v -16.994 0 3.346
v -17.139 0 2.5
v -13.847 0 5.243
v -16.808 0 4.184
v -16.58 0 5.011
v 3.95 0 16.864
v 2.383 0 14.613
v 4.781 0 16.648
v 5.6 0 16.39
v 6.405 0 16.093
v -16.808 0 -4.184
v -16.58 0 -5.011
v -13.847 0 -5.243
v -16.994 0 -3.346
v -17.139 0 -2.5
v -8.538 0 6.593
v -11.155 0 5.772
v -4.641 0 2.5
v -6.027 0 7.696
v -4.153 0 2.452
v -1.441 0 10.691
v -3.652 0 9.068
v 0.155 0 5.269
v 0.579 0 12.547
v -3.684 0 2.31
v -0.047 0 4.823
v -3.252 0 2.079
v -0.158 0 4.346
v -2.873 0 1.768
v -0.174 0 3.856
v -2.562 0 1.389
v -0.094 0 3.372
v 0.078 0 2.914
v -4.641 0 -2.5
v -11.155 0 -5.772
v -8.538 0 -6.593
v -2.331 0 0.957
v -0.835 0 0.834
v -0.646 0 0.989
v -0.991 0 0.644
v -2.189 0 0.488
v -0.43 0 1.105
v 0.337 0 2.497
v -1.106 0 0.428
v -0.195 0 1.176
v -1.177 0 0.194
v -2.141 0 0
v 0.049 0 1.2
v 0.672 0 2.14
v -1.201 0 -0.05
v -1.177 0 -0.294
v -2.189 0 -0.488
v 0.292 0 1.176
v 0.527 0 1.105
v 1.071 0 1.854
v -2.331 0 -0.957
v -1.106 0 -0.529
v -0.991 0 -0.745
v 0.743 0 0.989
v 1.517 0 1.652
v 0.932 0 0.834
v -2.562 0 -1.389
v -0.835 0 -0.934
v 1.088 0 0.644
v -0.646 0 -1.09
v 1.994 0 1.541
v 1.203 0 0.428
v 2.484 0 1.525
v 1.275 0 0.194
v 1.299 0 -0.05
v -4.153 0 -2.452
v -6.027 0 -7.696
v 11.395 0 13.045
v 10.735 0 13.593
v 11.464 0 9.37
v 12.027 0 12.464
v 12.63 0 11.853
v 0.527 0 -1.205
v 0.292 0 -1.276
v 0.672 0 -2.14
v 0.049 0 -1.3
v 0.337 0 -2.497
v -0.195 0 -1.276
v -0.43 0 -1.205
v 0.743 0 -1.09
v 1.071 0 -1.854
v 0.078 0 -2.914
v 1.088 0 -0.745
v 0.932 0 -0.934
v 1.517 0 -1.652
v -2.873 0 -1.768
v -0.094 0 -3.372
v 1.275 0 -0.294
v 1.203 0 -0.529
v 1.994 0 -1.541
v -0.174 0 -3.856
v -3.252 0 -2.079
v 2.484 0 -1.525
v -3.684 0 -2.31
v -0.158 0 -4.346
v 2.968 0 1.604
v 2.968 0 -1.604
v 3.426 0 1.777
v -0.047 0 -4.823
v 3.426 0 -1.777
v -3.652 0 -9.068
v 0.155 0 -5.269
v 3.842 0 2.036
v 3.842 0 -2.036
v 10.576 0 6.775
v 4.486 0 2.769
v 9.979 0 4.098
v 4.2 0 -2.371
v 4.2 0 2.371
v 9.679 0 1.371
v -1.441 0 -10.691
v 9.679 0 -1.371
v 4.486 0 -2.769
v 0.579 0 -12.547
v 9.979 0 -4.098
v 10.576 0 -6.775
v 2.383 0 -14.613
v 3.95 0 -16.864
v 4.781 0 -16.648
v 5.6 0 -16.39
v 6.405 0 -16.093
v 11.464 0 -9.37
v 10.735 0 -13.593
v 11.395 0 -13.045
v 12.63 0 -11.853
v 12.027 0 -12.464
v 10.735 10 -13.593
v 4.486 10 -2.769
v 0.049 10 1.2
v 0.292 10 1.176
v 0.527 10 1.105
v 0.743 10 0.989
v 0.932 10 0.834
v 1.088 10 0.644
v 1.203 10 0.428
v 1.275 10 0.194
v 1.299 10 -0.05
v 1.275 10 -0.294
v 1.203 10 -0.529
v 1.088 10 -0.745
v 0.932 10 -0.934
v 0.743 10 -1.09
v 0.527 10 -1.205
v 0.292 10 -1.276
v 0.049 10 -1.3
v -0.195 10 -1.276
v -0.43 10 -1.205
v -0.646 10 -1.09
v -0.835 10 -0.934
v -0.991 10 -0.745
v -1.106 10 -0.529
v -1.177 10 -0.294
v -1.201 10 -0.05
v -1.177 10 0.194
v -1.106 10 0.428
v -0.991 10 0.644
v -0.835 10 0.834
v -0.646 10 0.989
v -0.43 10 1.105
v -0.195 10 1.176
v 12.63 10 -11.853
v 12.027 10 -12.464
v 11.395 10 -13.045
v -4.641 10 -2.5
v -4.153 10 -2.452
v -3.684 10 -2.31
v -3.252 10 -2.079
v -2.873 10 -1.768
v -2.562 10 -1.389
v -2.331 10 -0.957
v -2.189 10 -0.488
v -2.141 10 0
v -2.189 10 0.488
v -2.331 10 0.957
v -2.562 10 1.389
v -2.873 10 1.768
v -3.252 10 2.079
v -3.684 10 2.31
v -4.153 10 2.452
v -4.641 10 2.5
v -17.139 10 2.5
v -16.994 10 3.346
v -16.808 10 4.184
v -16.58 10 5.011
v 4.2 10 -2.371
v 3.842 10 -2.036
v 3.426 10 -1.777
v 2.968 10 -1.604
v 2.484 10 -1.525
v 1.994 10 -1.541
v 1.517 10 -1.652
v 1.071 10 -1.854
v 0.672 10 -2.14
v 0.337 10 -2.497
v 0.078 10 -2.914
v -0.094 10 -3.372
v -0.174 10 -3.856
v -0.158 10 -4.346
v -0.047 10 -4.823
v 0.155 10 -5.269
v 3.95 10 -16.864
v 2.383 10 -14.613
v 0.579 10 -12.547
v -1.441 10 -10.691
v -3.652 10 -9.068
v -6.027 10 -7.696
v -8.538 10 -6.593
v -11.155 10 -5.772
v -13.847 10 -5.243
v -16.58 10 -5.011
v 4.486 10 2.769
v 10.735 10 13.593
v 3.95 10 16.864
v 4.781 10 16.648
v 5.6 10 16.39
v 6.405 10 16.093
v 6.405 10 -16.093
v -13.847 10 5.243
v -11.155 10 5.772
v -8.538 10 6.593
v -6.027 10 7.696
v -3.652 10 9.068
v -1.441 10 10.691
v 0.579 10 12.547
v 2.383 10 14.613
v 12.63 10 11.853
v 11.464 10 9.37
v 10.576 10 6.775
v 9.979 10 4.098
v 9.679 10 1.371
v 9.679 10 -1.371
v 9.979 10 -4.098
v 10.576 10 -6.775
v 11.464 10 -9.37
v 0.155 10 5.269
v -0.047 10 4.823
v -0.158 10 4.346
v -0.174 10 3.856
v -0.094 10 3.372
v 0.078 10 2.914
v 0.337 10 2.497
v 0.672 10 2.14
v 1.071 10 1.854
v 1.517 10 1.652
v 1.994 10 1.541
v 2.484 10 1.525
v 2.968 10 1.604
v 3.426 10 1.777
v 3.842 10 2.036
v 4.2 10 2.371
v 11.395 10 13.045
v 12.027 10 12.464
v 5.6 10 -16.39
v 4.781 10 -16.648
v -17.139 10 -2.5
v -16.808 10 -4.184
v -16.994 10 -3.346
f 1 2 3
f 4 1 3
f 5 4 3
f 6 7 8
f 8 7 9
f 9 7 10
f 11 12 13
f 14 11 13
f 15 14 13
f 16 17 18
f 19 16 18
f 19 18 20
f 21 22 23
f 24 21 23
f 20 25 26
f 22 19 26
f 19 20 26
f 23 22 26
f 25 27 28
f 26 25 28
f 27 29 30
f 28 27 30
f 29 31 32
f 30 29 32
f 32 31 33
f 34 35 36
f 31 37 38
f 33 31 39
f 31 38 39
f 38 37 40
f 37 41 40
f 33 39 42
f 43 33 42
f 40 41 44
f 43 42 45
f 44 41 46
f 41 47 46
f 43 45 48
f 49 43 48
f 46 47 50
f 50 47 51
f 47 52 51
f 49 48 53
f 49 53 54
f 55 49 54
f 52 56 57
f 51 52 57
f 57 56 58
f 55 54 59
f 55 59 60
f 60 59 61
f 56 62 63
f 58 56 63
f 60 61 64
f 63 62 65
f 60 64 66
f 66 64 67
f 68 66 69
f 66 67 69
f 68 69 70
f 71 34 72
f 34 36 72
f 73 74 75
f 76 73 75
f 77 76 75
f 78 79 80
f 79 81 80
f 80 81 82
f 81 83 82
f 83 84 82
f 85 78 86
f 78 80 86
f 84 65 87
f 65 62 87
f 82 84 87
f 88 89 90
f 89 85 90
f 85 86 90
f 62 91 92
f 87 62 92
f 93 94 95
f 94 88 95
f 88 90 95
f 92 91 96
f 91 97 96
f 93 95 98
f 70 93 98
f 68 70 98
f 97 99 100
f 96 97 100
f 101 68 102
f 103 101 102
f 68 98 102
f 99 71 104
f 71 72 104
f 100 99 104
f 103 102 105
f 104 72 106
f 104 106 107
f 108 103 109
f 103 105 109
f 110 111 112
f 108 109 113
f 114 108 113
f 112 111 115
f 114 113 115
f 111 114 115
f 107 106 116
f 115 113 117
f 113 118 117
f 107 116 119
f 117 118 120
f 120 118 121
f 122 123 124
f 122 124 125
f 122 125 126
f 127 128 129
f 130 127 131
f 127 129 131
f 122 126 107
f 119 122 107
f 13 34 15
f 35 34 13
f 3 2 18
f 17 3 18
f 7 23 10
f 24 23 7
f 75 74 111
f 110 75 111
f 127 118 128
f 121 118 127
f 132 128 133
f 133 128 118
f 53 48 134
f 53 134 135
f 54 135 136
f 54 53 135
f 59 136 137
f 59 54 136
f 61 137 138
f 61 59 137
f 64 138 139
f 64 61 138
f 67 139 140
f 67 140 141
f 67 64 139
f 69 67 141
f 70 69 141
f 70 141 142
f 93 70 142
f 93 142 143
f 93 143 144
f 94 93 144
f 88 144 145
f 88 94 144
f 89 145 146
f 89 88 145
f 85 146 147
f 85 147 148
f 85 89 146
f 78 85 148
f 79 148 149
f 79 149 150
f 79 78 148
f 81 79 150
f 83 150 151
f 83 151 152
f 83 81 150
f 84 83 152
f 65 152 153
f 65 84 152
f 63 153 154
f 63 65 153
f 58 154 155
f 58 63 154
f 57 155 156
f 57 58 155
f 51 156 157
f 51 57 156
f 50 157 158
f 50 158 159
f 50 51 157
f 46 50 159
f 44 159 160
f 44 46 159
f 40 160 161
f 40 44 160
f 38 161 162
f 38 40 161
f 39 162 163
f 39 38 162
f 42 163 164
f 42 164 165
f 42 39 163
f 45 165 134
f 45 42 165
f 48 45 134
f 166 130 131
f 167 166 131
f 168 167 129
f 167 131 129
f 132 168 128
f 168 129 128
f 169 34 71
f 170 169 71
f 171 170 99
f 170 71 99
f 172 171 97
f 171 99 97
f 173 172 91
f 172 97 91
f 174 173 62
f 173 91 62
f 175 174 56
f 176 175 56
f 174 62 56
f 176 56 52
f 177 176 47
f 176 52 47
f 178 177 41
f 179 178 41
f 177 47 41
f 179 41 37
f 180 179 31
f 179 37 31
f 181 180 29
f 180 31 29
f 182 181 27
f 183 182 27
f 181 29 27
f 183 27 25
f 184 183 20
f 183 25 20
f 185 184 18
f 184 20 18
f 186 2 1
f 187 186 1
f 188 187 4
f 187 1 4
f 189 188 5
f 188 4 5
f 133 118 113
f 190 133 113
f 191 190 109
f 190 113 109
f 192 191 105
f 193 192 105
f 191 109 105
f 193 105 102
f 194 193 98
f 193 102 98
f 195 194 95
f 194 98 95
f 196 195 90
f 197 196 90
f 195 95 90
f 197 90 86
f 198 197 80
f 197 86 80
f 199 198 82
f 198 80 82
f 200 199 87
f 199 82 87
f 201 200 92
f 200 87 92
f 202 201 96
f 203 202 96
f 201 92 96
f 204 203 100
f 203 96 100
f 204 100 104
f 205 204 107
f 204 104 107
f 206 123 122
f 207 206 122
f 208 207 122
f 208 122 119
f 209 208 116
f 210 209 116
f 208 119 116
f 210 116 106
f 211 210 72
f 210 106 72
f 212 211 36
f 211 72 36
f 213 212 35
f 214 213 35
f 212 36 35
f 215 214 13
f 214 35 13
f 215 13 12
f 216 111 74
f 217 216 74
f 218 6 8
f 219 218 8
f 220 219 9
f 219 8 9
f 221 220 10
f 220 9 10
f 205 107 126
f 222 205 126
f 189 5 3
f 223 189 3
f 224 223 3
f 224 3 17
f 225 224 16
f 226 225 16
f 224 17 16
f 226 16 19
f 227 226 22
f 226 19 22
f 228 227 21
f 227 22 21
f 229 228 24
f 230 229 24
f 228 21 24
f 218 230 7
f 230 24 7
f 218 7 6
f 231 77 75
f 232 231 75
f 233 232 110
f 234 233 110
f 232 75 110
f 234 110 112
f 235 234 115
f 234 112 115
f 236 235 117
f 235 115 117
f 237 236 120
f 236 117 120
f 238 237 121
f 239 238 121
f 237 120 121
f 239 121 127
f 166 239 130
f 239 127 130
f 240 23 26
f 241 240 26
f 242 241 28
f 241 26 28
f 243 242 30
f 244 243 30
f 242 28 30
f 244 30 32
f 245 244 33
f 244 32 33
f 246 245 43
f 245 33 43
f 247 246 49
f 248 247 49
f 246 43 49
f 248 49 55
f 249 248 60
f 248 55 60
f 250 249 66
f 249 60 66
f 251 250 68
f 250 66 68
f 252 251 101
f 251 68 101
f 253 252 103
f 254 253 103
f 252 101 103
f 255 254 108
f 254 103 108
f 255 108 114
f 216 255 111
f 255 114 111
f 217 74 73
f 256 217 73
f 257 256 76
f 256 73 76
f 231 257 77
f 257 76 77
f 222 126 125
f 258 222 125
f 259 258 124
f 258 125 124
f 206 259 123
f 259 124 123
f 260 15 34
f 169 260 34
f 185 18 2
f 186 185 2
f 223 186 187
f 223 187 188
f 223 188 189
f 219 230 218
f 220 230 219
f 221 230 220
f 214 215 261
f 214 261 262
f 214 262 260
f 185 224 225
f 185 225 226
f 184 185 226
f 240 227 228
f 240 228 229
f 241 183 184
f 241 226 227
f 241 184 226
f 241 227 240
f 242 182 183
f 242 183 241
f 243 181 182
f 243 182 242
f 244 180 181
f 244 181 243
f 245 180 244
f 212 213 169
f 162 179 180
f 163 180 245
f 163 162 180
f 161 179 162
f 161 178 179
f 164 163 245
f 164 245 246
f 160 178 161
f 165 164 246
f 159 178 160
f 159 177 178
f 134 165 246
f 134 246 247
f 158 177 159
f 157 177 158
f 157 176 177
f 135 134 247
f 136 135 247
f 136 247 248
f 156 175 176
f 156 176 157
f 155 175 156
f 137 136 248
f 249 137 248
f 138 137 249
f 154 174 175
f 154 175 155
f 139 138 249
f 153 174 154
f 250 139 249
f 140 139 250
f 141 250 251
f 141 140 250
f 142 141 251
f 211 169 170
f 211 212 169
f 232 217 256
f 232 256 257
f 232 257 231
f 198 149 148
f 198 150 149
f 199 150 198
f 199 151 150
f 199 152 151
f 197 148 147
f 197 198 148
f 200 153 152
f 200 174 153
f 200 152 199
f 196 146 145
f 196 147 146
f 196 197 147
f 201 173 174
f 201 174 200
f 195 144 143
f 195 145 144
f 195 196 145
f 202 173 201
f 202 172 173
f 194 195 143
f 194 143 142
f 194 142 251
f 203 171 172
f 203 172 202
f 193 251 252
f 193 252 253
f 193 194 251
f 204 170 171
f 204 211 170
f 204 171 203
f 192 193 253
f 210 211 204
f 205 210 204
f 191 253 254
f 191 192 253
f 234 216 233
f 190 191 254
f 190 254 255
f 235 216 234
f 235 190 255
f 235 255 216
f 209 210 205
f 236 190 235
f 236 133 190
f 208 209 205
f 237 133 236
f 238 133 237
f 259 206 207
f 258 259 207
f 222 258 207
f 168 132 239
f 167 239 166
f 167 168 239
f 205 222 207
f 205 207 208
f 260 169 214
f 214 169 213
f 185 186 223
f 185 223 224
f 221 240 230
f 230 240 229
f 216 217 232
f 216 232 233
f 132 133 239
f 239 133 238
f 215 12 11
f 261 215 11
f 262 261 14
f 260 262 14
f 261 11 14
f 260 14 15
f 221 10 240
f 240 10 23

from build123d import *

# Parameters (mm, degrees)
SKETCH_1_R      = 1.25
EXTRUDE_1_DEPTH = 10


with BuildPart() as part:
    # 草圖1 → 填料-伸長1 (new body)
    with BuildSketch(Plane(origin=(0, 0, 0), x_dir=(1, 0, 0), z_dir=(0, 1, 0))):
        with BuildLine():
            Line((0.155444566, 5.269237886), (6.404504741, 16.092927609))
            ThreePointArc((6.404504741, 16.092927609), (5.191725275, 16.524103264), (3.950274568, 16.864024752))
            ThreePointArc((3.950274568, 16.864024752), (-4.820507676, 8.349364213), (-16.579811129, 5.010974248))
            ThreePointArc((-16.579811129, 5.010974248), (-16.906155839, 3.765885654), (-17.139136501, 2.5))
            Line((-17.139136501, 2.5), (-4.641016151, 2.5))
            ThreePointArc((-4.641016151, 2.5), (-2.141016151, 0), (-4.641016151, -2.5))
            Line((-4.641016151, -2.5), (-17.139136501, -2.5))
            ThreePointArc((-17.139136501, -2.5), (-16.906155839, -3.765885654), (-16.579811129, -5.010974248))
            ThreePointArc((-16.579811129, -5.010974248), (-4.820507676, -8.349364213), (3.950274568, -16.864024752))
            ThreePointArc((3.950274568, -16.864024752), (5.191725275, -16.524103264), (6.404504741, -16.092927609))
            Line((6.404504741, -16.092927609), (0.155444566, -5.269237886))
            ThreePointArc((0.155444566, -5.269237886), (1.070508076, -1.854174377), (4.485571585, -2.769237886))
            Line((4.485571585, -2.769237886), (10.73463176, -13.592927609))
            ThreePointArc((10.73463176, -13.592927609), (11.714430563, -12.75821761), (12.629536561, -11.853050504))
            ThreePointArc((12.629536561, -11.853050504), (9.641015352, 0), (12.629536561, 11.853050504))
            ThreePointArc((12.629536561, 11.853050504), (11.714430563, 12.75821761), (10.73463176, 13.592927609))
            Line((10.73463176, 13.592927609), (4.485571585, 2.769237886))
            ThreePointArc((4.485571585, 2.769237886), (1.070508076, 1.854174377), (0.155444566, 5.269237886))
        make_face()
        with Locations(Location((0.048558271, 0.050271222, 0), (0, 0, 270))):
            Circle(SKETCH_1_R, mode=Mode.SUBTRACT)
    extrude(amount=EXTRUDE_1_DEPTH)


solid = part.part
